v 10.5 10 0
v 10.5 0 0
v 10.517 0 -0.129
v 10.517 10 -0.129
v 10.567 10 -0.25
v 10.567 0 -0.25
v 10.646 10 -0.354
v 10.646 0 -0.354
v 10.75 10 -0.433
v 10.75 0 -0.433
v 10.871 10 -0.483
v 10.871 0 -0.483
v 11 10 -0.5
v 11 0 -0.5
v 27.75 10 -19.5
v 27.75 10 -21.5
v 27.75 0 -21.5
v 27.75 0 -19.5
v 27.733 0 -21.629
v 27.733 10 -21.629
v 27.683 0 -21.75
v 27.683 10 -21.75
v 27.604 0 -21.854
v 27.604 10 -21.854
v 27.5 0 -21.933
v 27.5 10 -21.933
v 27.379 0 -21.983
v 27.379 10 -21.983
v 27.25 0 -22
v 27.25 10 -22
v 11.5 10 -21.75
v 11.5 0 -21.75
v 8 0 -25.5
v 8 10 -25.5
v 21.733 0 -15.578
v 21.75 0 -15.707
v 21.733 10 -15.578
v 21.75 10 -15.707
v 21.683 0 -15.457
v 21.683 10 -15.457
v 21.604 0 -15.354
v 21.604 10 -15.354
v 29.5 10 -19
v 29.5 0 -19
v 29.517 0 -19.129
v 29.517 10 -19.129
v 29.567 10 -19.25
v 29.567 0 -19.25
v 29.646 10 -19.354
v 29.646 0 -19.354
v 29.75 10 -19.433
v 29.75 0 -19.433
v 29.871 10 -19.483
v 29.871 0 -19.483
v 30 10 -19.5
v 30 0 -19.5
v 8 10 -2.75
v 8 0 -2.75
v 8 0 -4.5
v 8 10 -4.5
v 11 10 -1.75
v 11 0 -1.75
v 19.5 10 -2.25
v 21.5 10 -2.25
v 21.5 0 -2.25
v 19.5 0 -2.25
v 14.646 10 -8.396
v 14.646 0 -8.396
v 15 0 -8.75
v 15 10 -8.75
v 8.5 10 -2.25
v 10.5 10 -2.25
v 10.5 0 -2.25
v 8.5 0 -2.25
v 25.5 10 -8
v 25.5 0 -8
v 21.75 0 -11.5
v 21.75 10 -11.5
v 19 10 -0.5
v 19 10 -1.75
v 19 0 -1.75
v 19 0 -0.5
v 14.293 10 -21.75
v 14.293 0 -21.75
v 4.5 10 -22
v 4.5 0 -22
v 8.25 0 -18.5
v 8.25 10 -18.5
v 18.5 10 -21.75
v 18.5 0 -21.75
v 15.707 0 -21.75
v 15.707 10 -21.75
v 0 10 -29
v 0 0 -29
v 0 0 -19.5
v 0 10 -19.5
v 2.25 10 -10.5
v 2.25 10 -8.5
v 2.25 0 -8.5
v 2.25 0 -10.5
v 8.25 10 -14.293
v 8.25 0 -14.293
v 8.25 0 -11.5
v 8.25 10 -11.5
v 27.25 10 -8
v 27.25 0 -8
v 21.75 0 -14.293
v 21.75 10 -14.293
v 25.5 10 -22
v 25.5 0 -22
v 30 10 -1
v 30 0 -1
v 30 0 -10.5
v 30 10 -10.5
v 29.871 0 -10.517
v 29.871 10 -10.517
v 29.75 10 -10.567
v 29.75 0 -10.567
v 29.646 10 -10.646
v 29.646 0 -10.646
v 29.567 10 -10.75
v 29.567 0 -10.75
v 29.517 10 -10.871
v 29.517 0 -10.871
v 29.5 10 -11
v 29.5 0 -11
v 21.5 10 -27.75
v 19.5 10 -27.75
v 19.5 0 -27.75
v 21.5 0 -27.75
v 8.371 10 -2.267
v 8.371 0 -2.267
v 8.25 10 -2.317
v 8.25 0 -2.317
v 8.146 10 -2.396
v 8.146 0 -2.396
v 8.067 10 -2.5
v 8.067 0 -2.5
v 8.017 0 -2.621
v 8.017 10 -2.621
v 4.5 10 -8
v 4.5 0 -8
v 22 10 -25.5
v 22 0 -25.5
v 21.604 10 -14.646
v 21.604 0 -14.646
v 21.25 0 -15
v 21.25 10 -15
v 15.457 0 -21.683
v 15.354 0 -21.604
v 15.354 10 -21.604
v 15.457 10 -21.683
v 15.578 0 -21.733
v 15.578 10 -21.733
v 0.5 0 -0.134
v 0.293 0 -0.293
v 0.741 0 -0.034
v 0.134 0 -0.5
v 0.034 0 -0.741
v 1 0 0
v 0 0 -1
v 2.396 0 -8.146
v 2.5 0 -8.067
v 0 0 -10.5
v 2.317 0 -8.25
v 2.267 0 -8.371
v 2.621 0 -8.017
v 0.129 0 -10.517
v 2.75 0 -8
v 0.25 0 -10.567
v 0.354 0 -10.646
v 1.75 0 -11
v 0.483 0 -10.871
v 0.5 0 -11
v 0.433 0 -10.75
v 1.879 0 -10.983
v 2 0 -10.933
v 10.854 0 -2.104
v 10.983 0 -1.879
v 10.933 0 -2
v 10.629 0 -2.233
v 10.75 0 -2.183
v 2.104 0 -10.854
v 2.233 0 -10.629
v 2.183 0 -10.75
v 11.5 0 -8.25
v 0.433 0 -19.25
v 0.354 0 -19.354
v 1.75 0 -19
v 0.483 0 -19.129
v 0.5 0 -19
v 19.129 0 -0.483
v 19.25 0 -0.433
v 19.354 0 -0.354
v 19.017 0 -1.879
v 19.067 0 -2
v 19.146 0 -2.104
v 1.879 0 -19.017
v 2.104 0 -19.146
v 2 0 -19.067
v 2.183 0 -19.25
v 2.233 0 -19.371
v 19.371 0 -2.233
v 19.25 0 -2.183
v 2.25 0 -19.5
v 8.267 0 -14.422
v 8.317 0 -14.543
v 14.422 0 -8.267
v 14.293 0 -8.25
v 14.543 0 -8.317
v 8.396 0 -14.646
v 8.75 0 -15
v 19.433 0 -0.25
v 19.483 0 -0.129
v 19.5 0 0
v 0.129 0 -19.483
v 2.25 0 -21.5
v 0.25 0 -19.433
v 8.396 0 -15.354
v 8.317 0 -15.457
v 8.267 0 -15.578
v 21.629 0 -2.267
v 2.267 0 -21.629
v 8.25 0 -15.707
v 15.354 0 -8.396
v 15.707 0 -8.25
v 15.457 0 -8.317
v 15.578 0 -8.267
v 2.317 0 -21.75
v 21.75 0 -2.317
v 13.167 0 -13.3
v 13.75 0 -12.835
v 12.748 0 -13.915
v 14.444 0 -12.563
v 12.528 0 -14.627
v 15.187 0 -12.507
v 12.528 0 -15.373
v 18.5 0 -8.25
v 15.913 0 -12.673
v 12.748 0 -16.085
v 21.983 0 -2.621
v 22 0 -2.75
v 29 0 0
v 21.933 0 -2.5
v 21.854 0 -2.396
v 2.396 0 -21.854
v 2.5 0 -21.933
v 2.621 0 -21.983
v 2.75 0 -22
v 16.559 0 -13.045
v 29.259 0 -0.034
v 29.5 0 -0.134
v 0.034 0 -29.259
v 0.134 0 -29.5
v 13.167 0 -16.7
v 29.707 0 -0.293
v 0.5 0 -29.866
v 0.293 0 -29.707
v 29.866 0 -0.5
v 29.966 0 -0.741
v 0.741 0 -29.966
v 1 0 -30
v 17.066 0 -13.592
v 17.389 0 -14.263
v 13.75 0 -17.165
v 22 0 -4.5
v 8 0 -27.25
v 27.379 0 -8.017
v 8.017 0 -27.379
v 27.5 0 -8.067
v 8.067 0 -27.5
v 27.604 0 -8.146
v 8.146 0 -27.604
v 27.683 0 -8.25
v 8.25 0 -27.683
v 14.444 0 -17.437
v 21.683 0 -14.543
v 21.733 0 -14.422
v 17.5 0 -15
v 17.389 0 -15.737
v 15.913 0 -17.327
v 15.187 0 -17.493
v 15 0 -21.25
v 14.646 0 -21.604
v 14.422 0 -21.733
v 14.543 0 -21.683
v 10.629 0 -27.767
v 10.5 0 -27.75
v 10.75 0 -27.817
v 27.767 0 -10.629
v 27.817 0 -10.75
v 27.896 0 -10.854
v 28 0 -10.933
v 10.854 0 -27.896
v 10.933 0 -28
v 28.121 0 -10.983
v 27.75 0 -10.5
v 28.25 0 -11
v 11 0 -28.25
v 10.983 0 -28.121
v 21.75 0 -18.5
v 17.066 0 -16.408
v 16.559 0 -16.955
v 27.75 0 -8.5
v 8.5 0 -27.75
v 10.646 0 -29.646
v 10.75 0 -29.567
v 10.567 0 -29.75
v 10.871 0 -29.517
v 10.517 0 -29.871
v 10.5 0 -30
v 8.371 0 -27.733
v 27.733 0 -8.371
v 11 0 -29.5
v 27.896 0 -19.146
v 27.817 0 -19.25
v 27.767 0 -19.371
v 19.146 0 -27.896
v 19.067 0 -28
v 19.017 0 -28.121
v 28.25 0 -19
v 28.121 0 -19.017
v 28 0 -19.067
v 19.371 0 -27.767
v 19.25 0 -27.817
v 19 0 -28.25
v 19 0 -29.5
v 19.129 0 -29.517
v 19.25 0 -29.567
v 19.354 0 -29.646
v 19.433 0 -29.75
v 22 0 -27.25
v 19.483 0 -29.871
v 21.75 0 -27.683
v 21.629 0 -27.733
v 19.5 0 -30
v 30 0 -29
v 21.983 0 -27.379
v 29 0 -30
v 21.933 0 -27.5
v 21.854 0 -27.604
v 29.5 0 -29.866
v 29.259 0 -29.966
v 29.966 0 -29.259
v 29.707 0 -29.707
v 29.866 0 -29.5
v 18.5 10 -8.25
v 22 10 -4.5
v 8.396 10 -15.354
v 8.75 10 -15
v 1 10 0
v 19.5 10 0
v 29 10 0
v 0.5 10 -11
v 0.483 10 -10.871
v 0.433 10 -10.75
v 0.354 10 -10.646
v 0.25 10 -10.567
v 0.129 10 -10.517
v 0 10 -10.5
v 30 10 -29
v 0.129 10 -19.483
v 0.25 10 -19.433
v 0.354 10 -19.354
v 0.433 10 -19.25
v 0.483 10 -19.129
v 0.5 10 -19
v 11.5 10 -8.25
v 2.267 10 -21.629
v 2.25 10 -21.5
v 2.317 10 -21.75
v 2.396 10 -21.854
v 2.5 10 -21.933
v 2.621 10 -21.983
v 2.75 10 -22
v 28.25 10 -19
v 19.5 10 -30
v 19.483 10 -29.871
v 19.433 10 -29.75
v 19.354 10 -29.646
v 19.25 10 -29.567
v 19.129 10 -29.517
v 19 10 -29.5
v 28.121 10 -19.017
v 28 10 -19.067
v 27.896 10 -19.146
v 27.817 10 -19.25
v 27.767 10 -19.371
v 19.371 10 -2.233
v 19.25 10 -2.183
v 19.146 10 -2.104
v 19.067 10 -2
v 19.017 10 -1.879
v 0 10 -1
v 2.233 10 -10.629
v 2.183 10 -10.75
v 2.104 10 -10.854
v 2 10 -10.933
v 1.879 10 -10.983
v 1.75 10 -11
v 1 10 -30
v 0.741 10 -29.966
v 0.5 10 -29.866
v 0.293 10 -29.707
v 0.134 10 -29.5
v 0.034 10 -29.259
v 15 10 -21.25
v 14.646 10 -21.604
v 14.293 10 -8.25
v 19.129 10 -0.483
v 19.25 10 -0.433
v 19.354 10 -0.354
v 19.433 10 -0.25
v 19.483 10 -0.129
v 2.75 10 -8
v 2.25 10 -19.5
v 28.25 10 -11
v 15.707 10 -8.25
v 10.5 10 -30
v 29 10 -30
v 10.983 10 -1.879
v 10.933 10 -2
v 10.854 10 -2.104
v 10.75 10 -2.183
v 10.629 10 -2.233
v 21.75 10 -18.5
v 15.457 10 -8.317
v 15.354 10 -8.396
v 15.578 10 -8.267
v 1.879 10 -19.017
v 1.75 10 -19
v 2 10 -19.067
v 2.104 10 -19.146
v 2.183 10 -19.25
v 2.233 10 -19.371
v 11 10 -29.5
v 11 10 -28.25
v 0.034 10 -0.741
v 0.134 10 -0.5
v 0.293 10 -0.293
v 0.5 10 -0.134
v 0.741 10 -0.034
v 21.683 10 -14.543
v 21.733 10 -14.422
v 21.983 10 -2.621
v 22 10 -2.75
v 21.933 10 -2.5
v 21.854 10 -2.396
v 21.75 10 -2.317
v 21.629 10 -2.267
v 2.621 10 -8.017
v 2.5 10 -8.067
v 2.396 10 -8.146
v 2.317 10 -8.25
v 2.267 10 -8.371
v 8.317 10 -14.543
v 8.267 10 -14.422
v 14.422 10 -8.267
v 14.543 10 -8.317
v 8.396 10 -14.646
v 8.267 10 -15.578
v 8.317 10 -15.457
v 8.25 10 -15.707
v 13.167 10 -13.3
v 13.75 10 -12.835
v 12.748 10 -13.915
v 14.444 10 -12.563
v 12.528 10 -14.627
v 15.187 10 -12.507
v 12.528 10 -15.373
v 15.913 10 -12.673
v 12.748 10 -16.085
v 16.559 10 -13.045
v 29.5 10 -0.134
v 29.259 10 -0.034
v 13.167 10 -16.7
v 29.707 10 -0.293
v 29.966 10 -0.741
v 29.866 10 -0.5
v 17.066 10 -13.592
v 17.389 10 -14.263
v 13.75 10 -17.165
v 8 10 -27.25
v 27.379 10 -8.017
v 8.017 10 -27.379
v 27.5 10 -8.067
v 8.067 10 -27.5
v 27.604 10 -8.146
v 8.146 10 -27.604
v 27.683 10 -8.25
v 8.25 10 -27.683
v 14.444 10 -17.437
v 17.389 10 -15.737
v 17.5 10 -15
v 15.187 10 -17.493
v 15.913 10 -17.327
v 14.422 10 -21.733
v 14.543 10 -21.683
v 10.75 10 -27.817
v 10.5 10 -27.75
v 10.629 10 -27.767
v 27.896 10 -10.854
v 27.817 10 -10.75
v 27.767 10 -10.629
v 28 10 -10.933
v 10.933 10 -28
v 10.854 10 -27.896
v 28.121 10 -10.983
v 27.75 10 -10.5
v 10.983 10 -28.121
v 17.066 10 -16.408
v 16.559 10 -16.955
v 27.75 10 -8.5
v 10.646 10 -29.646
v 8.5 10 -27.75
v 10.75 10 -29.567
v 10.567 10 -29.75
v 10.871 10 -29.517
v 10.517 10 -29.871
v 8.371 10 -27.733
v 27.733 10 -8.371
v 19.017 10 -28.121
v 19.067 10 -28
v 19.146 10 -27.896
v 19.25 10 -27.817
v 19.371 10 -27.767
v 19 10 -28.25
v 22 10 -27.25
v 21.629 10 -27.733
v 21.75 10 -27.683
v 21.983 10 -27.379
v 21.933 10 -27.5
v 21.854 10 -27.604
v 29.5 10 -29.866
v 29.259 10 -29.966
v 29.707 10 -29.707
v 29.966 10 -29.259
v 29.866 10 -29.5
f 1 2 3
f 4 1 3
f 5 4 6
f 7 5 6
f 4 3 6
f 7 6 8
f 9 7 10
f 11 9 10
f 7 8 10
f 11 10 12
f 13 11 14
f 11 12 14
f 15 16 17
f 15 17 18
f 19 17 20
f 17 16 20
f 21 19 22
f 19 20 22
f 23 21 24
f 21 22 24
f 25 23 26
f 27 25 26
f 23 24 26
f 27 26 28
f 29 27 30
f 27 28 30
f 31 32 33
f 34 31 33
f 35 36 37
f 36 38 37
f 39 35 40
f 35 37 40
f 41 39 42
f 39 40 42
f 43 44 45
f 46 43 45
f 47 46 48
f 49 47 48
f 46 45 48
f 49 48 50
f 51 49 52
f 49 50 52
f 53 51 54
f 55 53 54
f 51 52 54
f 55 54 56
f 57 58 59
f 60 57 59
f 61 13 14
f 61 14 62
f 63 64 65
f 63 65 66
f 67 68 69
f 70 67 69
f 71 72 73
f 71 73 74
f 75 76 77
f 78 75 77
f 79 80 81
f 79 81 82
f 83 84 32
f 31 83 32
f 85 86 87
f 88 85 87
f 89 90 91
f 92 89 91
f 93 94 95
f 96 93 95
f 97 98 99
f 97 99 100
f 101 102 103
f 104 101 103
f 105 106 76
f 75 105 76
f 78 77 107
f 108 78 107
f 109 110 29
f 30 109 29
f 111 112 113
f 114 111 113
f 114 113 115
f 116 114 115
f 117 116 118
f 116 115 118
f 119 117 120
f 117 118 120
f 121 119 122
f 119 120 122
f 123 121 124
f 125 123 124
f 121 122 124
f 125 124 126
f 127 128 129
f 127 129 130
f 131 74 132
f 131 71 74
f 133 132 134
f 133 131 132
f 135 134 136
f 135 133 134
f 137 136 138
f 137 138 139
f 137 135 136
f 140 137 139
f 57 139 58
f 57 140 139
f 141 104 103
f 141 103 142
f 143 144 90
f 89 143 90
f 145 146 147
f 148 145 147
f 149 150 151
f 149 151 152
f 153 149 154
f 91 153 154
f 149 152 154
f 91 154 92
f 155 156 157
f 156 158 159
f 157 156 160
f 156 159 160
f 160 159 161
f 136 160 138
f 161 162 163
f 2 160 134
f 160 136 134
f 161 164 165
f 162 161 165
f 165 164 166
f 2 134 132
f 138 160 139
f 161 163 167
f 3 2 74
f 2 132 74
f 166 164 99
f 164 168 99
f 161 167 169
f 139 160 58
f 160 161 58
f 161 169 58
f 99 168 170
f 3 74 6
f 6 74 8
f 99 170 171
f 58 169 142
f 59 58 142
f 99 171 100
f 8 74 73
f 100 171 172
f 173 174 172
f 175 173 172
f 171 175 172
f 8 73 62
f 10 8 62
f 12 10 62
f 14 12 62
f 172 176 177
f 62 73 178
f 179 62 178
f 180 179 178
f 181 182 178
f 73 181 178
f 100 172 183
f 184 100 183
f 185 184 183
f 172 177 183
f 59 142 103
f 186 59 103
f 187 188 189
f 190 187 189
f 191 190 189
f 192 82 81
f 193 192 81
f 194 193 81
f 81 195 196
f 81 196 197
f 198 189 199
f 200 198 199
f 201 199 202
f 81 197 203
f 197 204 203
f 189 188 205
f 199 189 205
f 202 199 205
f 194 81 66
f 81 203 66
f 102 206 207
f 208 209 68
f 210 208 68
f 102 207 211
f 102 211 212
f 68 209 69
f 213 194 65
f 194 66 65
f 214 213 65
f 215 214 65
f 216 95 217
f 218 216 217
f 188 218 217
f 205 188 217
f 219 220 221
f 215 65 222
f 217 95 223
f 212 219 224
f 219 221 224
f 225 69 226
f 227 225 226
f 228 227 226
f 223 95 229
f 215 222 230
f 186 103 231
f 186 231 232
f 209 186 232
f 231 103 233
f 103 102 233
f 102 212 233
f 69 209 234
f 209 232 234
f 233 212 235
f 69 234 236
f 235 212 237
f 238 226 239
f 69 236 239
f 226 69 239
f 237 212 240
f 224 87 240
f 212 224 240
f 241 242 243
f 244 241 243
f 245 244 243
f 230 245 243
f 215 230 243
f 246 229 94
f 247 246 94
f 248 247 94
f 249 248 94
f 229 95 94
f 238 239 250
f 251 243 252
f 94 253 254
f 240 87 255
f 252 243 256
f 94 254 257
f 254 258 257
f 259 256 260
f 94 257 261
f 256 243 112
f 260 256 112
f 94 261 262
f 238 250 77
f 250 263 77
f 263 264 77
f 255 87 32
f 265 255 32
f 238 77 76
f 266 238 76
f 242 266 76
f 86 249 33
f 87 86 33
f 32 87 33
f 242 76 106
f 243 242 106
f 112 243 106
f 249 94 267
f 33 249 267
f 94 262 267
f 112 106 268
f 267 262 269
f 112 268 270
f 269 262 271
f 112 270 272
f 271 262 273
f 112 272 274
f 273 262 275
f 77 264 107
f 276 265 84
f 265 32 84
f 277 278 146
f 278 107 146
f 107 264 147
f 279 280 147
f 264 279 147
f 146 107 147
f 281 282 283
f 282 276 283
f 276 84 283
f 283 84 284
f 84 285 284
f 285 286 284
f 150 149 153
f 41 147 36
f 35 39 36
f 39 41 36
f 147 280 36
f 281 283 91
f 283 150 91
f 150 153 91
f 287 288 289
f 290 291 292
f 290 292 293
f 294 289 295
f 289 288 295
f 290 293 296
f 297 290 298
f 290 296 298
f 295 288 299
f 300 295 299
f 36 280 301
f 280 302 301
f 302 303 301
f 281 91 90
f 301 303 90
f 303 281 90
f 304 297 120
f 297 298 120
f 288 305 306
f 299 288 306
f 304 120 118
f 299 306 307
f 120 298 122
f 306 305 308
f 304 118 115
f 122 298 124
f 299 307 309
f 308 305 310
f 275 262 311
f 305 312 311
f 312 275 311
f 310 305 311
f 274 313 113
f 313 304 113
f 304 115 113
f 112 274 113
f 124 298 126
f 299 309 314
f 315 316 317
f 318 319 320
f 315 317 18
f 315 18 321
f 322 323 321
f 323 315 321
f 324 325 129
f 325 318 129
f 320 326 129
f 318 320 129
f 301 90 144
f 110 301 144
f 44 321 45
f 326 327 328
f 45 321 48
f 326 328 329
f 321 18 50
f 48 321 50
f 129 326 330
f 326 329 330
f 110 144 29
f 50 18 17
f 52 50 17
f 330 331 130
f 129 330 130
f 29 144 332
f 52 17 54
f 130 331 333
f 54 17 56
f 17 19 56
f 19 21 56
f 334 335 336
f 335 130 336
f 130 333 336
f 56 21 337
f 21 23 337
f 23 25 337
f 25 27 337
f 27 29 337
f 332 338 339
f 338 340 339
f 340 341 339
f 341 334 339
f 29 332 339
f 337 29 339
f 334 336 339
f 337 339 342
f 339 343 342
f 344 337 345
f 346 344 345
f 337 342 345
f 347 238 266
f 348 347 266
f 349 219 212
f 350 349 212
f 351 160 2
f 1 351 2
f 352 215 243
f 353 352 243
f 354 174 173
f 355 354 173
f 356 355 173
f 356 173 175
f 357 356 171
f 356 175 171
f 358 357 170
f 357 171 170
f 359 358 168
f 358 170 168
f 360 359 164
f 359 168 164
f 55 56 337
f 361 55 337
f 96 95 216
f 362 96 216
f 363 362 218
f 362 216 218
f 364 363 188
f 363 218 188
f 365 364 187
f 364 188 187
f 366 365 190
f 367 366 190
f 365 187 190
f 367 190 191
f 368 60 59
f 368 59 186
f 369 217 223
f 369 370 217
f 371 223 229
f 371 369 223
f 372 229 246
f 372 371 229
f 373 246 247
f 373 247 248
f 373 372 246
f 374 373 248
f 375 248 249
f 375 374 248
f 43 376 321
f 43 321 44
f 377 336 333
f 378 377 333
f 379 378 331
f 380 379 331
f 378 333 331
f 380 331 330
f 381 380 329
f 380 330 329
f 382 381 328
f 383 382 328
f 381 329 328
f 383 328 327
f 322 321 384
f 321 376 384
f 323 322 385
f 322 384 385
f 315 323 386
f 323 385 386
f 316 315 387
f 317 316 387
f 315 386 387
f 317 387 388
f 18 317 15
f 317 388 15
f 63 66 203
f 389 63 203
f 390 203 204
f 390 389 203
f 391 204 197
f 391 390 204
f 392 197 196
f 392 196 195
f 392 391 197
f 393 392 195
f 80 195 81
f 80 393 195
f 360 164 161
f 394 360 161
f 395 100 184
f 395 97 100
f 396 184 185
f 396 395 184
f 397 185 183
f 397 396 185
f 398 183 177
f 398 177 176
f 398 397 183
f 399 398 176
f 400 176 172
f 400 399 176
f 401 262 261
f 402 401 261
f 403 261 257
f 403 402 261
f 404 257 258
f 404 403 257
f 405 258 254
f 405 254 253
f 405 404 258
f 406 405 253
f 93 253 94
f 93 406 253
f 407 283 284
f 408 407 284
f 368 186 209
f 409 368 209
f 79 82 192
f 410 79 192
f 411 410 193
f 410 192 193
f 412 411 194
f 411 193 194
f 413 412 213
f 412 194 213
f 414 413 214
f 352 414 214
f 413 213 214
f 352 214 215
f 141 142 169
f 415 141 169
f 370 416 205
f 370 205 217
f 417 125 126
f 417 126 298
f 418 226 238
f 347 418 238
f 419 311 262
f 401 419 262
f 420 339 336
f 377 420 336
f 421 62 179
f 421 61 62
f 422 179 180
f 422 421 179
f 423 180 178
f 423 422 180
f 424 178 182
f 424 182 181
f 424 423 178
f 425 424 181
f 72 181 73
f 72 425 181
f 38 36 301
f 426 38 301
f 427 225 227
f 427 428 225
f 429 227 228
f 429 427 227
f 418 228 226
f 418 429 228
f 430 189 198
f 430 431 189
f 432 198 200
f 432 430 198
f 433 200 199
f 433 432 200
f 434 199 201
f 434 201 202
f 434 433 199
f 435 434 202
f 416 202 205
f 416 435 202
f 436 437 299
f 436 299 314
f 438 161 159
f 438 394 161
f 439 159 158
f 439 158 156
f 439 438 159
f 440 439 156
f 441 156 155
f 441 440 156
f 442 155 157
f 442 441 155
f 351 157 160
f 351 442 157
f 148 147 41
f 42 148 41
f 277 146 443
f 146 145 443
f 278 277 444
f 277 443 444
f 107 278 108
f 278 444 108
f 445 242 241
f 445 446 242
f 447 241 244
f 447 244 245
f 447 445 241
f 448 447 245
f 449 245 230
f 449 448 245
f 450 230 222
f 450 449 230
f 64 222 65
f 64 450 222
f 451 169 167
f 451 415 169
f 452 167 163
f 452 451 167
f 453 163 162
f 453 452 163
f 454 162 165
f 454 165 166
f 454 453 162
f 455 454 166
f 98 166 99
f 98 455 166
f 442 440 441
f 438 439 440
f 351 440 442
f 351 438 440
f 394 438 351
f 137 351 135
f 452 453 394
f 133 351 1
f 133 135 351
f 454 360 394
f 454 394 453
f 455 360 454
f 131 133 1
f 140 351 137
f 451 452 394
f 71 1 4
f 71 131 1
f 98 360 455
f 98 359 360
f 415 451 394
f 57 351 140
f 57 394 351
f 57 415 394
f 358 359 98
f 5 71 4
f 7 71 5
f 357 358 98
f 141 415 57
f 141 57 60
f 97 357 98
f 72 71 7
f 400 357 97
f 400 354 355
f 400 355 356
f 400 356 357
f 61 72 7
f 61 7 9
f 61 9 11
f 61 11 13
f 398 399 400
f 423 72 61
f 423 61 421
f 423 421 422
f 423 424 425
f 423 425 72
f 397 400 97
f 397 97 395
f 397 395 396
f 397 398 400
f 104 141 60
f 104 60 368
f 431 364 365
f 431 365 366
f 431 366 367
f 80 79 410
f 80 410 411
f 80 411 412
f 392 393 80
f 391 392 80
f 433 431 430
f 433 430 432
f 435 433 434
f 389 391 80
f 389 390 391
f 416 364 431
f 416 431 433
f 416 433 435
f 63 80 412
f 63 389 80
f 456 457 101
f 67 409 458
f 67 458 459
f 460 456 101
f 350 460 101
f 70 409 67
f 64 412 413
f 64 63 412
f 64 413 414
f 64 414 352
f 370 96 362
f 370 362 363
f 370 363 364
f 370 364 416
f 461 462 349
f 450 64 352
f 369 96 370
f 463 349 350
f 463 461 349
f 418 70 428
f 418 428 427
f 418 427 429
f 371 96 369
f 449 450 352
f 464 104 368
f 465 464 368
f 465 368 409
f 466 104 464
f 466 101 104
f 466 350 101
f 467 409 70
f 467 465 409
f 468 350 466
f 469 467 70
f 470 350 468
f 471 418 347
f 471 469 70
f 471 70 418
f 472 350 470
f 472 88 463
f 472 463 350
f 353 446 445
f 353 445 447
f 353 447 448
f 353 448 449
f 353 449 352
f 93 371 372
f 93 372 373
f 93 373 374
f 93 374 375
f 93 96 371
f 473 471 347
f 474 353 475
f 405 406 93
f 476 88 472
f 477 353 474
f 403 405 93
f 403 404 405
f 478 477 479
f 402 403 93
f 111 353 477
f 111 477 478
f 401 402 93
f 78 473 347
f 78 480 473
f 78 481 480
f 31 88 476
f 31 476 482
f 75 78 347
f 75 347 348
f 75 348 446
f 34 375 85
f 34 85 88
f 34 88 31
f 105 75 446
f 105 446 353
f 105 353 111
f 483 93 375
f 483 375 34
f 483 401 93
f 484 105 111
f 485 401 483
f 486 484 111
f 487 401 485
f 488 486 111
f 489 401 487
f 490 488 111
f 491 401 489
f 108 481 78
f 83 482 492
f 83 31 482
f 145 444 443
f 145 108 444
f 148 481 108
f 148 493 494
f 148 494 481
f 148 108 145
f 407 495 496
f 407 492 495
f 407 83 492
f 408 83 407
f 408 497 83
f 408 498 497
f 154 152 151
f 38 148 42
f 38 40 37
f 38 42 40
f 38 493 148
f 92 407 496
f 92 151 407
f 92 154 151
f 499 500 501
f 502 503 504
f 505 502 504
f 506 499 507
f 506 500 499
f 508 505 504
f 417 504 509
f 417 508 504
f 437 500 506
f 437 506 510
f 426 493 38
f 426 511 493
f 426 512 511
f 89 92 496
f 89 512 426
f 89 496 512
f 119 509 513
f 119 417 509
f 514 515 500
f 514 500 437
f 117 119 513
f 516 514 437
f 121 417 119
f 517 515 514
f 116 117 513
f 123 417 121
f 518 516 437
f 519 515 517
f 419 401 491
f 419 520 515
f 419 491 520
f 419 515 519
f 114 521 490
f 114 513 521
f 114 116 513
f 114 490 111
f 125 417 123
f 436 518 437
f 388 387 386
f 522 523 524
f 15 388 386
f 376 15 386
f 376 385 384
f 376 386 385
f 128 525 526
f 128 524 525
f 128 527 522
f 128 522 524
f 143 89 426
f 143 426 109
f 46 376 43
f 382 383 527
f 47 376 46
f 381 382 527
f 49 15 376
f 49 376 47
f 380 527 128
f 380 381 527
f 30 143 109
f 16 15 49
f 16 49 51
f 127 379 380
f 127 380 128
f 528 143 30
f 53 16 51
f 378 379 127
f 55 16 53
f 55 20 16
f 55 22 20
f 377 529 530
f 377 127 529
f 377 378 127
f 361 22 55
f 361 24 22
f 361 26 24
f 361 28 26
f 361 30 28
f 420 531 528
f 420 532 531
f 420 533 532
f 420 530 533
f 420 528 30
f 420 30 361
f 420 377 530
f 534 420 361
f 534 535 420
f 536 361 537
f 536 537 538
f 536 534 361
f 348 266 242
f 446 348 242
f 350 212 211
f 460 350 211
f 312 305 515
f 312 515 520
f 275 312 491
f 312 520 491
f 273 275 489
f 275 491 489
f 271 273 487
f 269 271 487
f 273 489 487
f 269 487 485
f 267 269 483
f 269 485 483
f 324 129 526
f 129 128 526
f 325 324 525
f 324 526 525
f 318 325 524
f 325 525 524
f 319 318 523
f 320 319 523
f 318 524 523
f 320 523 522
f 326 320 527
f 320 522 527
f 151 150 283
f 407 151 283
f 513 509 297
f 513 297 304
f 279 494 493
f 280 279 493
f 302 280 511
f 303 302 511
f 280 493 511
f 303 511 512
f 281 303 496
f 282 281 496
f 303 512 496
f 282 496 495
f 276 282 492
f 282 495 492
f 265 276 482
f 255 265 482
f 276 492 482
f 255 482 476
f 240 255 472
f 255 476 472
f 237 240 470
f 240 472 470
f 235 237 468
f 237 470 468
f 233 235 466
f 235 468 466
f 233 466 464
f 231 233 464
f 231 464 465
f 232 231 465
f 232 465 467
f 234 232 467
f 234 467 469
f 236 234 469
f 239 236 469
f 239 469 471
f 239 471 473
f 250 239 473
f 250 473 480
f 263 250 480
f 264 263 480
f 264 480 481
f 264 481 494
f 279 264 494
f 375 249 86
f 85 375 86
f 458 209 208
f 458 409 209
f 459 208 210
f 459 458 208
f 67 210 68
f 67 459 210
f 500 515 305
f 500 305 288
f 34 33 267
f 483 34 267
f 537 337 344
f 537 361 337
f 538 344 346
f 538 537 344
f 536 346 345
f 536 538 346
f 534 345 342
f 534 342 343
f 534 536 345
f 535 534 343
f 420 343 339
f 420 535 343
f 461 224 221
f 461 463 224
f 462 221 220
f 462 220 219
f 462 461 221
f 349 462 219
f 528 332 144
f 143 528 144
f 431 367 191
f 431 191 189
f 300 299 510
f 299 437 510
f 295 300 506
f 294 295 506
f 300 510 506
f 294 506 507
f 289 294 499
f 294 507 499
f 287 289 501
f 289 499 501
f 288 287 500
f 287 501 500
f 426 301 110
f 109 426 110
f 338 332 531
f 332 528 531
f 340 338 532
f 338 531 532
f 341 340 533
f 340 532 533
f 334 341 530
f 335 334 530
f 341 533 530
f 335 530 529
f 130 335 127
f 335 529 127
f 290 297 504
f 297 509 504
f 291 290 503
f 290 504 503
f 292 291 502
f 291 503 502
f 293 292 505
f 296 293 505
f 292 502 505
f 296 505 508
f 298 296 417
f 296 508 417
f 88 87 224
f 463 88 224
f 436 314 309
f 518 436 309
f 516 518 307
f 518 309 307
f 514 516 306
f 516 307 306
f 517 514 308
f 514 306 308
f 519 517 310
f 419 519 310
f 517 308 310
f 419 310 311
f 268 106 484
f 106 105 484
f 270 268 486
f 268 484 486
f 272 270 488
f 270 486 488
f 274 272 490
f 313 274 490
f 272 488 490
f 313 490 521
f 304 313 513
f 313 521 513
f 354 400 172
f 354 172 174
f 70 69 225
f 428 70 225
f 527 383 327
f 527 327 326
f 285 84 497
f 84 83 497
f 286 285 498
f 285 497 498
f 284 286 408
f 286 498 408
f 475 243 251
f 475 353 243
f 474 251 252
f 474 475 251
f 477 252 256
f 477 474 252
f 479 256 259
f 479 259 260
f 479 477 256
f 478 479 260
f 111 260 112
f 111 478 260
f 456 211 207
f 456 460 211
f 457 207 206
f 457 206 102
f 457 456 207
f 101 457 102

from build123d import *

# Parameters (mm, degrees)
BOSS_EXTRUDE1_DEPTH = 10
FILLET1_R           = 1
SKETCH4_R           = 2.5
CUT_EXTRUDE1_DEPTH  = 11
FILLET2_R           = 0.5


with BuildPart() as part:
    # Sketch3 → Boss-Extrude1 (new body)
    with BuildSketch(Plane(origin=(0, 0, 0), x_dir=(1, 0, 0), z_dir=(0, 1, 0))):
        with BuildLine():
            Line((11, 27.75), (11, 29.5))
            ThreePointArc((11, 29.5), (10.646446609, 29.646446609), (10.5, 30))
            Line((10.5, 30), (0, 30))
            Line((0, 30), (0, 19.5))
            ThreePointArc((0, 19.5), (0.353553391, 19.353553391), (0.5, 19))
            Line((0.5, 19), (2.25, 19))
            Line((2.25, 19), (2.25, 22))
            Line((2.25, 22), (4.5, 22))
            Line((4.5, 22), (8.25, 18.5))
            Line((8.25, 18.5), (8.25, 15.5))
            Line((8.25, 15.5), (8.75, 15))
            Line((8.75, 15), (8.25, 14.5))
            Line((8.25, 14.5), (8.25, 11.5))
            Line((8.25, 11.5), (4.5, 8))
            Line((4.5, 8), (2.25, 8))
            Line((2.25, 8), (2.25, 11))
            Line((2.25, 11), (0.5, 11))
            ThreePointArc((0.5, 11), (0.353553391, 10.646446609), (0, 10.5))
            Line((0, 10.5), (0, 0))
            Line((0, 0), (10.5, 0))
            ThreePointArc((10.5, 0), (10.646446609, 0.353553391), (11, 0.5))
            Line((11, 0.5), (11, 2.25))
            Line((11, 2.25), (8, 2.25))
            Line((8, 2.25), (8, 4.5))
            Line((8, 4.5), (11.5, 8.25))
            Line((11.5, 8.25), (14.5, 8.25))
            Line((14.5, 8.25), (15, 8.75))
            Line((15, 8.75), (15.5, 8.25))
            Line((15.5, 8.25), (18.5, 8.25))
            Line((18.5, 8.25), (22, 4.5))
            Line((22, 4.5), (22, 2.25))
            Line((22, 2.25), (19, 2.25))
            Line((19, 2.25), (19, 0.5))
            ThreePointArc((19, 0.5), (19.353553391, 0.353553391), (19.5, 0))
            Line((19.5, 0), (30, 0))
            Line((30, 0), (30, 10.5))
            ThreePointArc((30, 10.5), (29.646446609, 10.646446609), (29.5, 11))
            Line((29.5, 11), (27.75, 11))
            Line((27.75, 11), (27.75, 8))
            Line((27.75, 8), (25.5, 8))
            Line((25.5, 8), (21.75, 11.5))
            Line((21.75, 11.5), (21.75, 14.5))
            Line((21.75, 14.5), (21.25, 15))
            Line((21.25, 15), (21.75, 15.5))
            Line((21.75, 15.5), (21.75, 18.5))
            Line((21.75, 18.5), (25.5, 22))
            Line((25.5, 22), (27.75, 22))
            Line((27.75, 22), (27.75, 19))
            Line((27.75, 19), (29.5, 19))
            ThreePointArc((29.5, 19), (29.646446609, 19.353553391), (30, 19.5))
            Line((30, 19.5), (30, 30))
            Line((30, 30), (19.5, 30))
            ThreePointArc((19.5, 30), (19.353553391, 29.646446609), (19, 29.5))
            Line((19, 29.5), (19, 27.75))
            Line((19, 27.75), (22, 27.75))
            Line((22, 27.75), (22, 25.5))
            Line((22, 25.5), (18.5, 21.75))
            Line((18.5, 21.75), (15.5, 21.75))
            Line((15.5, 21.75), (15, 21.25))
            Line((15, 21.25), (14.5, 21.75))
            Line((14.5, 21.75), (11.5, 21.75))
            Line((11.5, 21.75), (8, 25.5))
            Line((8, 25.5), (8, 27.75))
            Line((8, 27.75), (11, 27.75))
        make_face()
    extrude(amount=BOSS_EXTRUDE1_DEPTH)

    # Fillet1
    fillet1_edges = [part.edges().sort_by_distance(p)[0] for p in [
        (30, 5, 0),
        (0, 5, 0),
        (0, 5, -30),
        (30, 5, -30),
    ]]
    fillet(fillet1_edges, radius=FILLET1_R)

    # Sketch4 → Cut-Extrude1 (cut, through all)
    with BuildSketch(Plane(origin=(0, 10, 0), x_dir=(1, 0, 0), z_dir=(0, 1, 0))):
        with Locations((15, 15)):
            Circle(SKETCH4_R)
    extrude(amount=-CUT_EXTRUDE1_DEPTH, mode=Mode.SUBTRACT)

    # Fillet2
    fillet2_edges = [part.edges().sort_by_distance(p)[0] for p in [
        (27.75, 5, -19),
        (27.75, 5, -22),
        (21.75, 5, -15.5),
        (21.75, 5, -14.5),
        (27.75, 5, -8),
        (27.75, 5, -11),
        (19, 5, -2.25),
        (22, 5, -2.25),
        (15.5, 5, -8.25),
        (14.5, 5, -8.25),
        (8, 5, -2.25),
        (11, 5, -2.25),
        (2.25, 5, -11),
        (2.25, 5, -8),
        (8.25, 5, -14.5),
        (8.25, 5, -15.5),
        (2.25, 5, -22),
        (2.25, 5, -19),
        (11, 5, -27.75),
        (8, 5, -27.75),
        (14.5, 5, -21.75),
        (15.5, 5, -21.75),
        (22, 5, -27.75),
        (19, 5, -27.75),
    ]]
    fillet(fillet2_edges, radius=FILLET2_R)


solid = part.part
